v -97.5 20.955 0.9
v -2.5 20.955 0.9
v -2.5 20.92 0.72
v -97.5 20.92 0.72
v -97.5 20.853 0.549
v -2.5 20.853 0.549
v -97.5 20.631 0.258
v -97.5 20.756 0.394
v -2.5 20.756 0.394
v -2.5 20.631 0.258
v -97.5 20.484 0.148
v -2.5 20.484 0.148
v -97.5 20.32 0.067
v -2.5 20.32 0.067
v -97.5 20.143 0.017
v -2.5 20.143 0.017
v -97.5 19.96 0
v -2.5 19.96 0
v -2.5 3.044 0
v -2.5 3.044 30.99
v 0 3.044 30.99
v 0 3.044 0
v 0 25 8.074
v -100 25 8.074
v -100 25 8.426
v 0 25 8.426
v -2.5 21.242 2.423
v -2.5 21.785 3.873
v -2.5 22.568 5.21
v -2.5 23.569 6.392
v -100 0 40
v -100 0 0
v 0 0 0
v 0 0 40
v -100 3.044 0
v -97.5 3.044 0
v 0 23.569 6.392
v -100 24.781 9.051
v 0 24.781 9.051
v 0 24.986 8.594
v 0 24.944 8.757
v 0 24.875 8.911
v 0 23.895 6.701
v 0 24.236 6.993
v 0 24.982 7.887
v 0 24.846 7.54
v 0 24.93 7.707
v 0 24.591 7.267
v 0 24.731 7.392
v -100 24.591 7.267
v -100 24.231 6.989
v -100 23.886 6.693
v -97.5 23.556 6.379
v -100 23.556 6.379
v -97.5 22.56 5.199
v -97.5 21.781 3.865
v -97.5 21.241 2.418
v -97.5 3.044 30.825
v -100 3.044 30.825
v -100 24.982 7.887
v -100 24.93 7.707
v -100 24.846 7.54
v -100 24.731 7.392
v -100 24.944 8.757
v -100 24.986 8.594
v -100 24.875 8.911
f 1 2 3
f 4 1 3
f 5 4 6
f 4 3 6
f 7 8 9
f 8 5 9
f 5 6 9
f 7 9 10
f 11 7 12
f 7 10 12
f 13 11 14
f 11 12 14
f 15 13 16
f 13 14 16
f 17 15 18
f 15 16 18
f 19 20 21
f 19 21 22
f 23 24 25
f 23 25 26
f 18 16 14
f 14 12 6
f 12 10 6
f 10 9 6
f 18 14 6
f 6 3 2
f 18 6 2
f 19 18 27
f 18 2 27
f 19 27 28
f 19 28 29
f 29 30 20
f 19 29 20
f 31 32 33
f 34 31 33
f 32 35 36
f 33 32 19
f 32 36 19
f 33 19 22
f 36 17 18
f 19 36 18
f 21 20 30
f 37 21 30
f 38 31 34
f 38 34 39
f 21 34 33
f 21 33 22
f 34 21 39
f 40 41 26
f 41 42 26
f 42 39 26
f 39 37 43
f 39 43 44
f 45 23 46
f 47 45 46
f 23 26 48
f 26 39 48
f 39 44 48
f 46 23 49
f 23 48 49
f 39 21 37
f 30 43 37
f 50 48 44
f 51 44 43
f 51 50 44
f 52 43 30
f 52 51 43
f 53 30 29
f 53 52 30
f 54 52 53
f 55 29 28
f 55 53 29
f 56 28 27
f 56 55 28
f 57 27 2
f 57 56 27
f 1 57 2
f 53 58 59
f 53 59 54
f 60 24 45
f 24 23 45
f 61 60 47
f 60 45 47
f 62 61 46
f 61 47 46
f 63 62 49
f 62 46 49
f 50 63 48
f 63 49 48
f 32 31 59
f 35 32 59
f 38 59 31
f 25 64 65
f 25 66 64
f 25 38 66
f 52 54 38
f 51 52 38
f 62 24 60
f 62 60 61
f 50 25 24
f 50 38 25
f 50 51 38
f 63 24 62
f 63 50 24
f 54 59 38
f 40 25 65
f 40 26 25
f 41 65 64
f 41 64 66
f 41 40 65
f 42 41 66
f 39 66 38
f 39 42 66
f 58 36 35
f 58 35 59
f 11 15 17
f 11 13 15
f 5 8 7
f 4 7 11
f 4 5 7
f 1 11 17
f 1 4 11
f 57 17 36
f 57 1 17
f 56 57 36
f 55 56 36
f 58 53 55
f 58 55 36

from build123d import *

# Parameters (mm, degrees)
SKETCH1_W               = 100
SKETCH1_H               = 25
BOSS_EXTRUDE1_DEPTH     = 40
CUT_EXTRUDE2_DEPTH      = 111.566721937
CUT_EXTRUDE2_DEPTH_BACK = 111.566721937
CUT_EXTRUDE3_DEPTH      = 111.566721937
CUT_EXTRUDE3_DEPTH_BACK = 111.566721937
FILLET1_R               = 1
FILLET2_R               = 1
FILLET3_R               = 1
CUT_EXTRUDE5_DEPTH      = 111.566721937
CUT_EXTRUDE5_DEPTH_BACK = 2.5
CUT_EXTRUDE6_DEPTH      = 111.566721937
CUT_EXTRUDE6_DEPTH_BACK = 2.5


with BuildPart() as part:
    # Sketch1 → Boss-Extrude1 (new body)
    with BuildSketch(Plane.XY):
        with Locations((-50, 12.5)):
            Rectangle(SKETCH1_W, SKETCH1_H)
    extrude(amount=BOSS_EXTRUDE1_DEPTH)

    # Sketch2 → Cut-Extrude2 (cut, two sides: drawn at the far end of the back side and taken through both)
    with BuildSketch(Plane(origin=(0, 0, 0), x_dir=(0, 0, -1), z_dir=(1, 0, 0)).offset(-CUT_EXTRUDE2_DEPTH_BACK)):
        Polygon((-121.448428088, -65.214643972), (-40, 0), (-8.776787265, 25), (72.671640823, 90.214643972), (-57.757647122, 253.111500148), (-251.877716033, 97.682212203), align=None)
    extrude(amount=CUT_EXTRUDE2_DEPTH + CUT_EXTRUDE2_DEPTH_BACK, mode=Mode.SUBTRACT)

    # Sketch3 → Cut-Extrude3 (cut, two sides: drawn at the far end of the back side and taken through both)
    with BuildSketch(Plane(origin=(0, 0, 0), x_dir=(0, 0, -1), z_dir=(1, 0, 0)).offset(-CUT_EXTRUDE3_DEPTH_BACK)):
        with BuildLine():
            Line((-62.314729864, 108.995582426), (-7.550030072, 25))
            ThreePointArc((-7.550030072, 25), (-4.293432475, 21.998146007), (0, 20.910491242))
            Line((0, 20.910491242), (100.271779857, 20.929846374))
            Line((100.271779857, 20.929846374), (195.785658883, 197.26707941))
            Line((195.785658883, 197.26707941), (33.199149162, 285.332815462))
            Line((33.199149162, 285.332815462), (-62.314729864, 108.995582426))
        make_face()
    extrude(amount=CUT_EXTRUDE3_DEPTH + CUT_EXTRUDE3_DEPTH_BACK, mode=Mode.SUBTRACT)

    # Fillet1
    fillet1_edges = [part.edges().sort_by_distance(p)[0] for p in [
        (-50, 25, 8.776787265),
    ]]
    fillet(fillet1_edges, radius=FILLET1_R)

    # Fillet2
    fillet2_edges = [part.edges().sort_by_distance(p)[0] for p in [
        (-50, 25, 7.550030072),
    ]]
    fillet(fillet2_edges, radius=FILLET2_R)

    # Fillet3
    fillet3_edges = [part.edges().sort_by_distance(p)[0] for p in [
        (-50, 20.910491242, 0),
    ]]
    fillet(fillet3_edges, radius=FILLET3_R)

    # Sketch4 → Cut-Extrude5 (cut, two sides: drawn at the far end of the back side and taken through both)
    with BuildSketch(Plane(origin=(0, 0, 0), x_dir=(0, 0, -1), z_dir=(1, 0, 0)).offset(-CUT_EXTRUDE5_DEPTH_BACK)):
        Polygon((101.259117222, 3.044212175), (0, 3.044212175), (-30.990460295, 3.044212175), (-6.392305733, 23.56865294), (71.356704641, 88.441607291), (262.495931804, 155.370159656), (292.398344384, 69.97276454), align=None)
    extrude(amount=CUT_EXTRUDE5_DEPTH + CUT_EXTRUDE5_DEPTH_BACK, mode=Mode.SUBTRACT)

    # Sketch5 → Cut-Extrude6 (cut, two sides: drawn at the far end of the back side and taken through both)
    with BuildSketch(Plane.ZY.offset(100).offset(-CUT_EXTRUDE6_DEPTH_BACK)):
        Polygon((-101.259117222, 3.044212175), (0, 3.044212175), (30.8250701, 3.044212175), (6.37948349, 23.555780442), (-71.190616863, 88.642555993), (-262.263101068, 155.761413714), (-292.331601426, 70.163069896), align=None)
    extrude(amount=CUT_EXTRUDE6_DEPTH + CUT_EXTRUDE6_DEPTH_BACK, mode=Mode.SUBTRACT)


solid = part.part
